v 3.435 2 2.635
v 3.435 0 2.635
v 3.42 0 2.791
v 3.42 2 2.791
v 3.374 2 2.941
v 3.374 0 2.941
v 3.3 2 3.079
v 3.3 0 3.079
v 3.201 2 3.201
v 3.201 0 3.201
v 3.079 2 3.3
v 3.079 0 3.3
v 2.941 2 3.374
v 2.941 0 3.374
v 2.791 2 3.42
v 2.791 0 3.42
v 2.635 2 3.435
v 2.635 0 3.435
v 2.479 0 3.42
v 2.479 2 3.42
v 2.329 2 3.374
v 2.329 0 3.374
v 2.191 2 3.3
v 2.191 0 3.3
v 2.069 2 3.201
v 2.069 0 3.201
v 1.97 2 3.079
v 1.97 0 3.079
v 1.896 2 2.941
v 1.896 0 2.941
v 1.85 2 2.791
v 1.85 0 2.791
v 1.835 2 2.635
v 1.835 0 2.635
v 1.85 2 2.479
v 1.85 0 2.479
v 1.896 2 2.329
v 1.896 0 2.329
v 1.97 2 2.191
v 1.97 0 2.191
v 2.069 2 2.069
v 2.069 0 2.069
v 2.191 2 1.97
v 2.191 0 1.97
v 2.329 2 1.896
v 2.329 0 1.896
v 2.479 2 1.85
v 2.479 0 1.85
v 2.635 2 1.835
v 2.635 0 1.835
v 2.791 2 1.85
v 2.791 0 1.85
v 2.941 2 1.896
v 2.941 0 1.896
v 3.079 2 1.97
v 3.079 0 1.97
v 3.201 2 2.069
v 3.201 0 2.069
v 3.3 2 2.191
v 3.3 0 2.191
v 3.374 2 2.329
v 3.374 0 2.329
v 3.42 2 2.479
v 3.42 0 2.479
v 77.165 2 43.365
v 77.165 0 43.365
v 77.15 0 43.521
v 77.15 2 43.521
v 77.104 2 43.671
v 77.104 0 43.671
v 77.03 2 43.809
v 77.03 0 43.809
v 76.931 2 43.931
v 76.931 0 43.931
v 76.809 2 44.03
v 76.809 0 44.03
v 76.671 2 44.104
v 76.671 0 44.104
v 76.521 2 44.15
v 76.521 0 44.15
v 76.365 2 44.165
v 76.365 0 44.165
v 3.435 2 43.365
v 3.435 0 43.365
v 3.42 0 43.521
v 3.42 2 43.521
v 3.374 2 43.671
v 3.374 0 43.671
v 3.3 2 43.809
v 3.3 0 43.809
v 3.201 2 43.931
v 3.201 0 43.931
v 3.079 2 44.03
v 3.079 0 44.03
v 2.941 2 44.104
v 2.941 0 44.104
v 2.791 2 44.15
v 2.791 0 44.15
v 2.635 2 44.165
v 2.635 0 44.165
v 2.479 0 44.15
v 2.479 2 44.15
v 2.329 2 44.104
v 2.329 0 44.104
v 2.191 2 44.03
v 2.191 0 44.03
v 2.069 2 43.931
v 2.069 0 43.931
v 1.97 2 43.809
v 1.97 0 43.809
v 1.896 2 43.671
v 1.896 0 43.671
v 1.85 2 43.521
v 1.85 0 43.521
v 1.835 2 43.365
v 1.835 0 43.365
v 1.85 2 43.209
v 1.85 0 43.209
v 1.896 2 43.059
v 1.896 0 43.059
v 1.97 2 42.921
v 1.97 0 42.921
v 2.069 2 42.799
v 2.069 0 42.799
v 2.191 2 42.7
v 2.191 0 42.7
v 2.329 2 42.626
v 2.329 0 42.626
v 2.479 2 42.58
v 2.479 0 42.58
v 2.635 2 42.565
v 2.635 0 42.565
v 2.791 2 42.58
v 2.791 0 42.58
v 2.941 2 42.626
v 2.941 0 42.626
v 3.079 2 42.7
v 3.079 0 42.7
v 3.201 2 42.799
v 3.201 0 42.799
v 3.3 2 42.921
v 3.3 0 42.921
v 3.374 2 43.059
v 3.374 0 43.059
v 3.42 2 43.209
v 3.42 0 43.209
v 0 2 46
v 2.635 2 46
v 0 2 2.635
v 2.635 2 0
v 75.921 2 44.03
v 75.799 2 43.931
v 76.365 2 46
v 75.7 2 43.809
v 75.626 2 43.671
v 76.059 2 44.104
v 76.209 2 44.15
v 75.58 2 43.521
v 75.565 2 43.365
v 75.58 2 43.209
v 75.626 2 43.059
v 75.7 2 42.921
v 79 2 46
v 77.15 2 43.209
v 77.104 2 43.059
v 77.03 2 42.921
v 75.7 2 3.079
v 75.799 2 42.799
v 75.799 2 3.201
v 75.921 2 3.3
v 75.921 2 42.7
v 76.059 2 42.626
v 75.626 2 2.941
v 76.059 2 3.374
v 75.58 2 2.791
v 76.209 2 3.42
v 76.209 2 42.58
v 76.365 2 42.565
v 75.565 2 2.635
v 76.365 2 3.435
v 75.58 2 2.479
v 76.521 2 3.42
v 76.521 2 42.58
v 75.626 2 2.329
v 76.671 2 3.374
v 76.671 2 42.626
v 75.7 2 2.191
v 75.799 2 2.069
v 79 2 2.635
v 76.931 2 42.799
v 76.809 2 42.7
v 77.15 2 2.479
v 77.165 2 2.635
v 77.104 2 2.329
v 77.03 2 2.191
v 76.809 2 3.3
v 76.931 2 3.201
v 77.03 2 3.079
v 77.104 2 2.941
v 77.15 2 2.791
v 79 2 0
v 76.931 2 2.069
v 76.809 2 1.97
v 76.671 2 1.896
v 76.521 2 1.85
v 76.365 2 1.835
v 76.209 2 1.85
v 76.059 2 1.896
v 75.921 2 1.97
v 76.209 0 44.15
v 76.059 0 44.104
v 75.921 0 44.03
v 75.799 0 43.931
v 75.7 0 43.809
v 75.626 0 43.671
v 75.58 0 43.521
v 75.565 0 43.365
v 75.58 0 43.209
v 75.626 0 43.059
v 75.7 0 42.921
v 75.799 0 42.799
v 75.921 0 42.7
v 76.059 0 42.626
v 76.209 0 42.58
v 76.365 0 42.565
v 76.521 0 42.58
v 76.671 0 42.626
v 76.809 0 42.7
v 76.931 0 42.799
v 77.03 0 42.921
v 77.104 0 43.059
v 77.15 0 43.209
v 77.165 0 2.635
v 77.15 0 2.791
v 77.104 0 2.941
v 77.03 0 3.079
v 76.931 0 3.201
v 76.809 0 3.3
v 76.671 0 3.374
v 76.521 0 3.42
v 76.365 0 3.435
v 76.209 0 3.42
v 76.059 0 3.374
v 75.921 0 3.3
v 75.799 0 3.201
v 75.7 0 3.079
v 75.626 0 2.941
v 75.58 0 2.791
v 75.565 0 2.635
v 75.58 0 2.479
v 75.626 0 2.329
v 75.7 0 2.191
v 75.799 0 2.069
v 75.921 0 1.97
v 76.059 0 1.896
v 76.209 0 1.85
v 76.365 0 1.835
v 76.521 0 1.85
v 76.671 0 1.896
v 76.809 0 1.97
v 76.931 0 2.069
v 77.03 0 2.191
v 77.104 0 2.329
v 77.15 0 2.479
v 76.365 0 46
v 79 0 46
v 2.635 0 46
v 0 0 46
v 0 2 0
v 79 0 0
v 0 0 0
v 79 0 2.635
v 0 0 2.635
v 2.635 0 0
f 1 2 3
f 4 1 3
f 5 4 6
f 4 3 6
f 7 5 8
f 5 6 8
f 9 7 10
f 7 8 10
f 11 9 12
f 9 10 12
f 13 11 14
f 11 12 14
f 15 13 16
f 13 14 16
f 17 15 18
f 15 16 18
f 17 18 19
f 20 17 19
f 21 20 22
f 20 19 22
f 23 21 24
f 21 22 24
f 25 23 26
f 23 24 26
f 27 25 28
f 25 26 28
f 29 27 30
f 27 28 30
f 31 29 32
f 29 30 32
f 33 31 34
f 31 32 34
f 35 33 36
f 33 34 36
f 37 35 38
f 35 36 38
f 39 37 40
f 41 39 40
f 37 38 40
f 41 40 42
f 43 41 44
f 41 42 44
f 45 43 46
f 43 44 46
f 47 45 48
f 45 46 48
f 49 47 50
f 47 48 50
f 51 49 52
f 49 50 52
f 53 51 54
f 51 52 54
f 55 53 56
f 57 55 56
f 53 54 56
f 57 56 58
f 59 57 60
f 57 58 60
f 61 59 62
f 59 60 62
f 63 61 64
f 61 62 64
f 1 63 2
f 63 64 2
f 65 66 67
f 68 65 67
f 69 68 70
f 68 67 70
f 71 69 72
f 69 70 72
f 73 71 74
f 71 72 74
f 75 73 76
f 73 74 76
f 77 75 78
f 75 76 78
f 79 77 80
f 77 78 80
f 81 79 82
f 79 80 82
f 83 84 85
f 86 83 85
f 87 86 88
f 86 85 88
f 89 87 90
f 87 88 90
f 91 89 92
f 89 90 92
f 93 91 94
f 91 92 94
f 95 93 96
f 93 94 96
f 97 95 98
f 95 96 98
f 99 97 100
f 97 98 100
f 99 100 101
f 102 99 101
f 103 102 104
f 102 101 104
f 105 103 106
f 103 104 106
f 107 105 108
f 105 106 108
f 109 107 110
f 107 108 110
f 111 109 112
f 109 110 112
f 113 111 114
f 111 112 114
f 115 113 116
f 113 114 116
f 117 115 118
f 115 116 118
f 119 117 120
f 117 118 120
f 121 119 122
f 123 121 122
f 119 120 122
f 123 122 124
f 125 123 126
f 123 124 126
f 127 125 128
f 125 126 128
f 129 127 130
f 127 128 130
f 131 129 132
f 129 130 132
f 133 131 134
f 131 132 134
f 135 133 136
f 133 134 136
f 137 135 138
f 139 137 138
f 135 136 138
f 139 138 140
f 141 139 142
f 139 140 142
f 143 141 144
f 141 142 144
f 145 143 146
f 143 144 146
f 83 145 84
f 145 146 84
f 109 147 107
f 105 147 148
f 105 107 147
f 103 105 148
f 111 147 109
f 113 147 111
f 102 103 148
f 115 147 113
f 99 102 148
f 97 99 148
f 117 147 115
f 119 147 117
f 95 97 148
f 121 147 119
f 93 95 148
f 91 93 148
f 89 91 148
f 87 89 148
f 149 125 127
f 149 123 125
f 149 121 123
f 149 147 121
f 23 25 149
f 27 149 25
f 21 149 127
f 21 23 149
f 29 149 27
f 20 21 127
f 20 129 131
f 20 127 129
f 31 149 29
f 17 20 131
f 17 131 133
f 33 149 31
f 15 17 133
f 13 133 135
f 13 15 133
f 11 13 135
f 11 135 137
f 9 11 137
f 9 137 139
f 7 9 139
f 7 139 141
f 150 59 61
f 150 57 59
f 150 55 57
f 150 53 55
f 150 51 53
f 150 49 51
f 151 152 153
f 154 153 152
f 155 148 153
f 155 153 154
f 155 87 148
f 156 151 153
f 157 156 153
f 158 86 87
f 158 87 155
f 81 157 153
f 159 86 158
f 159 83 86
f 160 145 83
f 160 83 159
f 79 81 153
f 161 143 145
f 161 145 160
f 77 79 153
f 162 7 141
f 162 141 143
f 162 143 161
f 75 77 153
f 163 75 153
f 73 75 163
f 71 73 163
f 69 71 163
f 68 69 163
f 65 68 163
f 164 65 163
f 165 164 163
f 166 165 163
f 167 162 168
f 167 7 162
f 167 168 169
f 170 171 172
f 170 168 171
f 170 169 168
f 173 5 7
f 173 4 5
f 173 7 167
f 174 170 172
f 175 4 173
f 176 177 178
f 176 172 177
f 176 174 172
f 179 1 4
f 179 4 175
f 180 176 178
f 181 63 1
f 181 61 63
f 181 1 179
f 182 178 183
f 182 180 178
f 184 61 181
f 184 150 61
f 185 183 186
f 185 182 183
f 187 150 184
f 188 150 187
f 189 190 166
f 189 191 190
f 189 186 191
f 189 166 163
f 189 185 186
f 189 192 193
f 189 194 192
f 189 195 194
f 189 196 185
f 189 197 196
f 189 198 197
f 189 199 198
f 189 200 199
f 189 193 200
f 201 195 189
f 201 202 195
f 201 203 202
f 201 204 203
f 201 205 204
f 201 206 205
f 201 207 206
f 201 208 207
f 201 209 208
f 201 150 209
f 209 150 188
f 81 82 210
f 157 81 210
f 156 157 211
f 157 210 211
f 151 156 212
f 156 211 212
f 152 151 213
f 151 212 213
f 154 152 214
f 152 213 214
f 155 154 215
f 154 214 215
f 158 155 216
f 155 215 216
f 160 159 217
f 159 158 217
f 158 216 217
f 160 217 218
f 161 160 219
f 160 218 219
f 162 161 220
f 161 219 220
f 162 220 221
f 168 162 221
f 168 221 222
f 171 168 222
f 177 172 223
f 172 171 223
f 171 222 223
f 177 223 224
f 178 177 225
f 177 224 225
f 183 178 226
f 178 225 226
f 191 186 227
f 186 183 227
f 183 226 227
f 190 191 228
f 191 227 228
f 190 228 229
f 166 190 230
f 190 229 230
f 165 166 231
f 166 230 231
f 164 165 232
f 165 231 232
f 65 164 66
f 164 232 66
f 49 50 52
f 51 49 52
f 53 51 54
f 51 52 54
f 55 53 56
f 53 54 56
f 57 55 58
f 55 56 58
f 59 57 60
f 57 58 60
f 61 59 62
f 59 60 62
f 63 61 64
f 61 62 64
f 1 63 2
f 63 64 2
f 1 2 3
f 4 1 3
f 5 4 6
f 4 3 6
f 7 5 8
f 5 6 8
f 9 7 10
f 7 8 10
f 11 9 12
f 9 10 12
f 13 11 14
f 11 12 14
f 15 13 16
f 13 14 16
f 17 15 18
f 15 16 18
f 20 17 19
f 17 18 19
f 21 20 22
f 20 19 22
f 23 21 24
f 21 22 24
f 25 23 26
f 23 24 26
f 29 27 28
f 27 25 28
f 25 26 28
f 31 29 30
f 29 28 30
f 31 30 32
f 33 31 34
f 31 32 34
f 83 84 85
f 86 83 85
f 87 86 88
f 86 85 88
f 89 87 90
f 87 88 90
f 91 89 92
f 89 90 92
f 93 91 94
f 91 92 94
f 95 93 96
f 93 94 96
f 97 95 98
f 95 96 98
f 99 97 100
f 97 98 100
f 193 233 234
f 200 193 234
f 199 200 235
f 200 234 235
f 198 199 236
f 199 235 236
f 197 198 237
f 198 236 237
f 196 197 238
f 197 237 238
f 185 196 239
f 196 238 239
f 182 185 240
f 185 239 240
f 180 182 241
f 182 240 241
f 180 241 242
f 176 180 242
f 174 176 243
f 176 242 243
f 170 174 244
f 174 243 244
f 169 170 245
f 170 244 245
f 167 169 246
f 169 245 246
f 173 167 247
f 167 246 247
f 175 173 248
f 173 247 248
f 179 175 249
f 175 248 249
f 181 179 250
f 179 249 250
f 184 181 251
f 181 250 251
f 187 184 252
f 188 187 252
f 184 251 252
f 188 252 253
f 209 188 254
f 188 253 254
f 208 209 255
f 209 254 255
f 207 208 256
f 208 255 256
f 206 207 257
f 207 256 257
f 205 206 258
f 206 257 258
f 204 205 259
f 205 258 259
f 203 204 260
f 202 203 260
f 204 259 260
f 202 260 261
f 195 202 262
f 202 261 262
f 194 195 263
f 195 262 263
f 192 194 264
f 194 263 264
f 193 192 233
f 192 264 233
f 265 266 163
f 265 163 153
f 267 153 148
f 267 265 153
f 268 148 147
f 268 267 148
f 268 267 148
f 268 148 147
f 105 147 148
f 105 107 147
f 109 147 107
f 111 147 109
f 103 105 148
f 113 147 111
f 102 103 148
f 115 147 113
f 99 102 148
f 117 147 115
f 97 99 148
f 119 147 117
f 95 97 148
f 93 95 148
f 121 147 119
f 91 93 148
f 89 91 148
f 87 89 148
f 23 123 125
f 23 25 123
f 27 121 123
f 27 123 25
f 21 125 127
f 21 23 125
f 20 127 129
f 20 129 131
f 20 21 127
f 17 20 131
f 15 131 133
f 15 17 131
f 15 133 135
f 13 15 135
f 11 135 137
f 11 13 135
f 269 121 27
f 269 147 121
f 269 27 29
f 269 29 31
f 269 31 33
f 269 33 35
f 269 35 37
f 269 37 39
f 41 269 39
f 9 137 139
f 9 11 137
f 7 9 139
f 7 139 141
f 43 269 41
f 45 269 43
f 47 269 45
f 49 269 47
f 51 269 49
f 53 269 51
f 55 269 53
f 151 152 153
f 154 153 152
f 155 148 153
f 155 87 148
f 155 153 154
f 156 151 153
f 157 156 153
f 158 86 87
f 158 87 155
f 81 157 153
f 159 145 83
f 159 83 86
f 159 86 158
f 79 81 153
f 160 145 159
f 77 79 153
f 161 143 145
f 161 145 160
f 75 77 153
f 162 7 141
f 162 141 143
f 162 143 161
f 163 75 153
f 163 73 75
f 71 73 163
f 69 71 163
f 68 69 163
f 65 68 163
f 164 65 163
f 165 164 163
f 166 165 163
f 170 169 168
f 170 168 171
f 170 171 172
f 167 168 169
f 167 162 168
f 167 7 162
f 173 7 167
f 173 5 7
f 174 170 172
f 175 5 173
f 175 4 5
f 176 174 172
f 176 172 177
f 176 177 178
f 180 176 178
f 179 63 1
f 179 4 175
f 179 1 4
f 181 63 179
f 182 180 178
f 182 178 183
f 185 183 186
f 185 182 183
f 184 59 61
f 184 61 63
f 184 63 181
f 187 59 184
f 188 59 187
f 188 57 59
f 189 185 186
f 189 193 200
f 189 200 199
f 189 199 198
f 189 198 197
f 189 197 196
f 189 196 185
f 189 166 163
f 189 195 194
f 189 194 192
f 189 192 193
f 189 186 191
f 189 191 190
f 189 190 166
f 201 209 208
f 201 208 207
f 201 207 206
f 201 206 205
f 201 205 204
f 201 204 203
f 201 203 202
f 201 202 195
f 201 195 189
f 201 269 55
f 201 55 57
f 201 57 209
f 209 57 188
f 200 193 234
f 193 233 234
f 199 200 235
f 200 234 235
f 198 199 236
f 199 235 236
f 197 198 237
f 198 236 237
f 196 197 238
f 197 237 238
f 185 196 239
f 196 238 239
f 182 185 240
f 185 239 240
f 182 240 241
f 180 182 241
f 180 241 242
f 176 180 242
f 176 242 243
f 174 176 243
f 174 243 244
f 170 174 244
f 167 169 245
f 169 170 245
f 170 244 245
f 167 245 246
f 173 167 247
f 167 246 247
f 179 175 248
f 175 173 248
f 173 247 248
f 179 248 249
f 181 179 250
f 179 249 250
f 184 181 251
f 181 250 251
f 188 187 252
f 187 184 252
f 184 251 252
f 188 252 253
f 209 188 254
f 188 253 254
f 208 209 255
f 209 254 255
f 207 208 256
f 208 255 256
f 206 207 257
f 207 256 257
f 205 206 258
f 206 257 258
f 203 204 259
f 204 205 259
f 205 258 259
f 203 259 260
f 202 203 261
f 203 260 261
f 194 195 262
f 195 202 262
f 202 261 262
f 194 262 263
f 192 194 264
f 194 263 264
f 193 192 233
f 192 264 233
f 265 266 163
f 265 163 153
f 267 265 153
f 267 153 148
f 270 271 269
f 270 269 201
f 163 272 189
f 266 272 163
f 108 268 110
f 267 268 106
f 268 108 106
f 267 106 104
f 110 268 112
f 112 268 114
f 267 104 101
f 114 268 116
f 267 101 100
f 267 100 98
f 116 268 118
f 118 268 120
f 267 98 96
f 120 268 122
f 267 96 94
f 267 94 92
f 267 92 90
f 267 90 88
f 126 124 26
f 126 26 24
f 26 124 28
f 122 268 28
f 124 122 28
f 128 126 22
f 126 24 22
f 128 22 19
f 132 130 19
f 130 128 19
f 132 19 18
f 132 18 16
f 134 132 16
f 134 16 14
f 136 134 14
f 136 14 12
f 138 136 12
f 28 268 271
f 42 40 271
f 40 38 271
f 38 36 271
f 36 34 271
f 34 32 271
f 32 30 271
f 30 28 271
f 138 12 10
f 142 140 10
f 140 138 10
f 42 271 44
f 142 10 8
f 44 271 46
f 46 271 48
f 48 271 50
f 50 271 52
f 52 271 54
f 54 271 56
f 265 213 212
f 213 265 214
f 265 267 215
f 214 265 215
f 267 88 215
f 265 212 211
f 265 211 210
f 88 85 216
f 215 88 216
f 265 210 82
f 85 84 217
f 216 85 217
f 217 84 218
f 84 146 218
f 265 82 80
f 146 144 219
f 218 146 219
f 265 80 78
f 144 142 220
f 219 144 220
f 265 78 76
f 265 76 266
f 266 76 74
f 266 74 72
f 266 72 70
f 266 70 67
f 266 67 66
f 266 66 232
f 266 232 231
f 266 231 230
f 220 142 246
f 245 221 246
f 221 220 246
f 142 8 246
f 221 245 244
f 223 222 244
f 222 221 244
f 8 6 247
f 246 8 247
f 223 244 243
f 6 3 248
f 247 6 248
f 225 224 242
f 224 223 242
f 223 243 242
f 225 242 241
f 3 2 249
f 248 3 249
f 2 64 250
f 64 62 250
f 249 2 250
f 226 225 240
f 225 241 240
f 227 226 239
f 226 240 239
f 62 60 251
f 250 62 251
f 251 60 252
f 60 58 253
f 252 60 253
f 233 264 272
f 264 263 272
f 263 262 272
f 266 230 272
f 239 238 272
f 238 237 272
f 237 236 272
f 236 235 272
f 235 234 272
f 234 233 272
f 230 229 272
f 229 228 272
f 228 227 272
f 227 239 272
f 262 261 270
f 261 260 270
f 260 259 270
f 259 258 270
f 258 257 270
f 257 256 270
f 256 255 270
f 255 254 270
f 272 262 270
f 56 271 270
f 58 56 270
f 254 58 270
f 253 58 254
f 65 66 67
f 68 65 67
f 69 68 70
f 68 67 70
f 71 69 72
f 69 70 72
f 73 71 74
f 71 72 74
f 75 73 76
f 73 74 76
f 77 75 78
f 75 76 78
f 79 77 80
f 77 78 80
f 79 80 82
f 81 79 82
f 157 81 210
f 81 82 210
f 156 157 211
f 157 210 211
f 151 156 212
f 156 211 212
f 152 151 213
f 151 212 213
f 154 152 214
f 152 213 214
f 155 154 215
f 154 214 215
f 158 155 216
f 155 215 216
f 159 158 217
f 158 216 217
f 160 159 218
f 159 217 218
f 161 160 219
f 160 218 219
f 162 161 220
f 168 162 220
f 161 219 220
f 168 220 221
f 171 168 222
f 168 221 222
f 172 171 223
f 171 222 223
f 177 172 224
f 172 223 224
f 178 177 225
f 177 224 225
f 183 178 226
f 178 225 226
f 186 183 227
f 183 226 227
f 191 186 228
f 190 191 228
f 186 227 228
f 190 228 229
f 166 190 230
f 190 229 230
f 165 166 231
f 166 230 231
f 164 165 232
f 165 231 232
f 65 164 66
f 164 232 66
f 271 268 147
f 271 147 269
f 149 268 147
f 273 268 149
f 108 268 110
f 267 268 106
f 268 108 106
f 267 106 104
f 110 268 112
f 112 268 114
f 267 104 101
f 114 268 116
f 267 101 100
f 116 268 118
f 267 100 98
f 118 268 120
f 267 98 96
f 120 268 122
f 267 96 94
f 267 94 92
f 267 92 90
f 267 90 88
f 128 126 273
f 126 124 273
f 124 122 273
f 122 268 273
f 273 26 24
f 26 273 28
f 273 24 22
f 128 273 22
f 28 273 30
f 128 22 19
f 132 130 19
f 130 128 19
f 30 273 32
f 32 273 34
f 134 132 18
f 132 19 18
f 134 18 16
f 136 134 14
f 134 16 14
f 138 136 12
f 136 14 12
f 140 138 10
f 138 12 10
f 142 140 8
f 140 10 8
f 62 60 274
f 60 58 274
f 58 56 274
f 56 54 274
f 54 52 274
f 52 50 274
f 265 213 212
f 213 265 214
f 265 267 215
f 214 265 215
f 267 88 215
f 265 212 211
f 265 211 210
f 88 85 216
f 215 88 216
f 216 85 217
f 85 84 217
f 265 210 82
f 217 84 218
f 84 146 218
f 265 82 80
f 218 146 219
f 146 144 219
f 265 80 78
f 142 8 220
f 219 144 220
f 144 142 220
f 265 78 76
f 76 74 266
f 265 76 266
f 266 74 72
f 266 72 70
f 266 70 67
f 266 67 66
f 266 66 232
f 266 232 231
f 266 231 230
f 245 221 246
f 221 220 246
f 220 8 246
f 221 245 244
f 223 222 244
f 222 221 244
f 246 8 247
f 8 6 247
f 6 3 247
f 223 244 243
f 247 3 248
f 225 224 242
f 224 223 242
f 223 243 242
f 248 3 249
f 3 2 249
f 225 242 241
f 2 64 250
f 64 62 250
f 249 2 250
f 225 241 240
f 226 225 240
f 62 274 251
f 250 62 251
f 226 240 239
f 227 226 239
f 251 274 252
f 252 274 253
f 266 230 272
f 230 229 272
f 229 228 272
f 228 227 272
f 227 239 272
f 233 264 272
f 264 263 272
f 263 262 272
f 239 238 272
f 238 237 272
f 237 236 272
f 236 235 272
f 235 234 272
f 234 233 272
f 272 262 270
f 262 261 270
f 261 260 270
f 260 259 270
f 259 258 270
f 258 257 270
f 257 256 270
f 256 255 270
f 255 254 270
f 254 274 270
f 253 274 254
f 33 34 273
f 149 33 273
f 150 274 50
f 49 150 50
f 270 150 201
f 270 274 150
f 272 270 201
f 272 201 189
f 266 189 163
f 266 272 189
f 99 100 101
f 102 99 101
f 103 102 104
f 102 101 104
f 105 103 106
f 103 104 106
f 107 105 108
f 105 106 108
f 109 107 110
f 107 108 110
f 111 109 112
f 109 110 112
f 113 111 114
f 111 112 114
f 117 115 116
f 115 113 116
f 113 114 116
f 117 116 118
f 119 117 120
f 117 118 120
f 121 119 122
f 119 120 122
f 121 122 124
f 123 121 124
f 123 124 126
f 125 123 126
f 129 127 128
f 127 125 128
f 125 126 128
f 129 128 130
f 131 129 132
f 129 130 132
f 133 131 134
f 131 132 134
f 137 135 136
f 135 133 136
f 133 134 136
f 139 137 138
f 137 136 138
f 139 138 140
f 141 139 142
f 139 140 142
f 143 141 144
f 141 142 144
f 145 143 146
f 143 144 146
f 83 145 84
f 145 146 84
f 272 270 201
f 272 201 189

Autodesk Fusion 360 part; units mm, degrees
sketch "Sketch1" plane through (0, 0, 0) normal (0, 1, 0) x (1, 0, 0)
  line L0 (0, 0) -> (79, 0)
  line L1 (79, 0) -> (79, -46)
  line L2 (79, -46) -> (0, -46)
  line L3 (0, -46) -> (0, 0)
  line L4 (79, -46) -> (76.365, -46)
  line L5 (76.365, -46) -> (76.365, -43.365)
  line L6 (79, 0) -> (79, -2.635)
  line L7 (79, -2.635) -> (76.365, -2.635)
  line L8 (0, -46) -> (2.635, -46)
  line L9 (2.635, -46) -> (2.635, -43.365)
  line L10 (0, 0) -> (2.635, 0)
  line L11 (2.635, 0) -> (2.635, -2.635)
  line L12 (2.635, -2.635) -> (0, -2.635)
  line L13 (0, -2.635) -> (0, 0)
  circle A0 centre (76.365, -43.365) radius 0.8
  circle A1 centre (76.365, -2.635) radius 0.8
  circle A2 centre (2.635, -2.635) radius 0.8
  circle A3 centre (2.635, -43.365) radius 0.8
  dimension "d1" = 46
  dimension "d2" = 79
  dimension "d5" = 2.635
  dimension "d6" = 2.635
  dimension "d7" = 2.635
  dimension "d8" = 2.635
  dimension "d9" = 2.635
  dimension "d10" = 2.635
  dimension "d11" = 2.635
  dimension "d12" = 2.635
  dimension "d13" = 1.6
  dimension "d14" = 1.6
  dimension "d15" = 1.6
  dimension "d16" = 1.6
extrude "Extrude2" add sketch "Sketch1" along normal blind 2 contours L0 L1 L2 L3 L4 L6 L8 L11 L12 A2 makes body 1
extrude "Extrude1" add sketch "Sketch1" along normal blind 2 separate body contours L0 L3 L10 L11 L12 L13 A2 | A3 | A0 | A1 | L0 L1 L2 L3 L4 L6 L8 L11 L12 A2 | L11 L12 A2 | L11 L12 A2 makes body 2
extrude "Extrude3" cut sketch "Sketch1" along normal blind 4 contours A3 | A0 | A1 | L11 L12 A2 | L11 L12 A2 bodies 2
